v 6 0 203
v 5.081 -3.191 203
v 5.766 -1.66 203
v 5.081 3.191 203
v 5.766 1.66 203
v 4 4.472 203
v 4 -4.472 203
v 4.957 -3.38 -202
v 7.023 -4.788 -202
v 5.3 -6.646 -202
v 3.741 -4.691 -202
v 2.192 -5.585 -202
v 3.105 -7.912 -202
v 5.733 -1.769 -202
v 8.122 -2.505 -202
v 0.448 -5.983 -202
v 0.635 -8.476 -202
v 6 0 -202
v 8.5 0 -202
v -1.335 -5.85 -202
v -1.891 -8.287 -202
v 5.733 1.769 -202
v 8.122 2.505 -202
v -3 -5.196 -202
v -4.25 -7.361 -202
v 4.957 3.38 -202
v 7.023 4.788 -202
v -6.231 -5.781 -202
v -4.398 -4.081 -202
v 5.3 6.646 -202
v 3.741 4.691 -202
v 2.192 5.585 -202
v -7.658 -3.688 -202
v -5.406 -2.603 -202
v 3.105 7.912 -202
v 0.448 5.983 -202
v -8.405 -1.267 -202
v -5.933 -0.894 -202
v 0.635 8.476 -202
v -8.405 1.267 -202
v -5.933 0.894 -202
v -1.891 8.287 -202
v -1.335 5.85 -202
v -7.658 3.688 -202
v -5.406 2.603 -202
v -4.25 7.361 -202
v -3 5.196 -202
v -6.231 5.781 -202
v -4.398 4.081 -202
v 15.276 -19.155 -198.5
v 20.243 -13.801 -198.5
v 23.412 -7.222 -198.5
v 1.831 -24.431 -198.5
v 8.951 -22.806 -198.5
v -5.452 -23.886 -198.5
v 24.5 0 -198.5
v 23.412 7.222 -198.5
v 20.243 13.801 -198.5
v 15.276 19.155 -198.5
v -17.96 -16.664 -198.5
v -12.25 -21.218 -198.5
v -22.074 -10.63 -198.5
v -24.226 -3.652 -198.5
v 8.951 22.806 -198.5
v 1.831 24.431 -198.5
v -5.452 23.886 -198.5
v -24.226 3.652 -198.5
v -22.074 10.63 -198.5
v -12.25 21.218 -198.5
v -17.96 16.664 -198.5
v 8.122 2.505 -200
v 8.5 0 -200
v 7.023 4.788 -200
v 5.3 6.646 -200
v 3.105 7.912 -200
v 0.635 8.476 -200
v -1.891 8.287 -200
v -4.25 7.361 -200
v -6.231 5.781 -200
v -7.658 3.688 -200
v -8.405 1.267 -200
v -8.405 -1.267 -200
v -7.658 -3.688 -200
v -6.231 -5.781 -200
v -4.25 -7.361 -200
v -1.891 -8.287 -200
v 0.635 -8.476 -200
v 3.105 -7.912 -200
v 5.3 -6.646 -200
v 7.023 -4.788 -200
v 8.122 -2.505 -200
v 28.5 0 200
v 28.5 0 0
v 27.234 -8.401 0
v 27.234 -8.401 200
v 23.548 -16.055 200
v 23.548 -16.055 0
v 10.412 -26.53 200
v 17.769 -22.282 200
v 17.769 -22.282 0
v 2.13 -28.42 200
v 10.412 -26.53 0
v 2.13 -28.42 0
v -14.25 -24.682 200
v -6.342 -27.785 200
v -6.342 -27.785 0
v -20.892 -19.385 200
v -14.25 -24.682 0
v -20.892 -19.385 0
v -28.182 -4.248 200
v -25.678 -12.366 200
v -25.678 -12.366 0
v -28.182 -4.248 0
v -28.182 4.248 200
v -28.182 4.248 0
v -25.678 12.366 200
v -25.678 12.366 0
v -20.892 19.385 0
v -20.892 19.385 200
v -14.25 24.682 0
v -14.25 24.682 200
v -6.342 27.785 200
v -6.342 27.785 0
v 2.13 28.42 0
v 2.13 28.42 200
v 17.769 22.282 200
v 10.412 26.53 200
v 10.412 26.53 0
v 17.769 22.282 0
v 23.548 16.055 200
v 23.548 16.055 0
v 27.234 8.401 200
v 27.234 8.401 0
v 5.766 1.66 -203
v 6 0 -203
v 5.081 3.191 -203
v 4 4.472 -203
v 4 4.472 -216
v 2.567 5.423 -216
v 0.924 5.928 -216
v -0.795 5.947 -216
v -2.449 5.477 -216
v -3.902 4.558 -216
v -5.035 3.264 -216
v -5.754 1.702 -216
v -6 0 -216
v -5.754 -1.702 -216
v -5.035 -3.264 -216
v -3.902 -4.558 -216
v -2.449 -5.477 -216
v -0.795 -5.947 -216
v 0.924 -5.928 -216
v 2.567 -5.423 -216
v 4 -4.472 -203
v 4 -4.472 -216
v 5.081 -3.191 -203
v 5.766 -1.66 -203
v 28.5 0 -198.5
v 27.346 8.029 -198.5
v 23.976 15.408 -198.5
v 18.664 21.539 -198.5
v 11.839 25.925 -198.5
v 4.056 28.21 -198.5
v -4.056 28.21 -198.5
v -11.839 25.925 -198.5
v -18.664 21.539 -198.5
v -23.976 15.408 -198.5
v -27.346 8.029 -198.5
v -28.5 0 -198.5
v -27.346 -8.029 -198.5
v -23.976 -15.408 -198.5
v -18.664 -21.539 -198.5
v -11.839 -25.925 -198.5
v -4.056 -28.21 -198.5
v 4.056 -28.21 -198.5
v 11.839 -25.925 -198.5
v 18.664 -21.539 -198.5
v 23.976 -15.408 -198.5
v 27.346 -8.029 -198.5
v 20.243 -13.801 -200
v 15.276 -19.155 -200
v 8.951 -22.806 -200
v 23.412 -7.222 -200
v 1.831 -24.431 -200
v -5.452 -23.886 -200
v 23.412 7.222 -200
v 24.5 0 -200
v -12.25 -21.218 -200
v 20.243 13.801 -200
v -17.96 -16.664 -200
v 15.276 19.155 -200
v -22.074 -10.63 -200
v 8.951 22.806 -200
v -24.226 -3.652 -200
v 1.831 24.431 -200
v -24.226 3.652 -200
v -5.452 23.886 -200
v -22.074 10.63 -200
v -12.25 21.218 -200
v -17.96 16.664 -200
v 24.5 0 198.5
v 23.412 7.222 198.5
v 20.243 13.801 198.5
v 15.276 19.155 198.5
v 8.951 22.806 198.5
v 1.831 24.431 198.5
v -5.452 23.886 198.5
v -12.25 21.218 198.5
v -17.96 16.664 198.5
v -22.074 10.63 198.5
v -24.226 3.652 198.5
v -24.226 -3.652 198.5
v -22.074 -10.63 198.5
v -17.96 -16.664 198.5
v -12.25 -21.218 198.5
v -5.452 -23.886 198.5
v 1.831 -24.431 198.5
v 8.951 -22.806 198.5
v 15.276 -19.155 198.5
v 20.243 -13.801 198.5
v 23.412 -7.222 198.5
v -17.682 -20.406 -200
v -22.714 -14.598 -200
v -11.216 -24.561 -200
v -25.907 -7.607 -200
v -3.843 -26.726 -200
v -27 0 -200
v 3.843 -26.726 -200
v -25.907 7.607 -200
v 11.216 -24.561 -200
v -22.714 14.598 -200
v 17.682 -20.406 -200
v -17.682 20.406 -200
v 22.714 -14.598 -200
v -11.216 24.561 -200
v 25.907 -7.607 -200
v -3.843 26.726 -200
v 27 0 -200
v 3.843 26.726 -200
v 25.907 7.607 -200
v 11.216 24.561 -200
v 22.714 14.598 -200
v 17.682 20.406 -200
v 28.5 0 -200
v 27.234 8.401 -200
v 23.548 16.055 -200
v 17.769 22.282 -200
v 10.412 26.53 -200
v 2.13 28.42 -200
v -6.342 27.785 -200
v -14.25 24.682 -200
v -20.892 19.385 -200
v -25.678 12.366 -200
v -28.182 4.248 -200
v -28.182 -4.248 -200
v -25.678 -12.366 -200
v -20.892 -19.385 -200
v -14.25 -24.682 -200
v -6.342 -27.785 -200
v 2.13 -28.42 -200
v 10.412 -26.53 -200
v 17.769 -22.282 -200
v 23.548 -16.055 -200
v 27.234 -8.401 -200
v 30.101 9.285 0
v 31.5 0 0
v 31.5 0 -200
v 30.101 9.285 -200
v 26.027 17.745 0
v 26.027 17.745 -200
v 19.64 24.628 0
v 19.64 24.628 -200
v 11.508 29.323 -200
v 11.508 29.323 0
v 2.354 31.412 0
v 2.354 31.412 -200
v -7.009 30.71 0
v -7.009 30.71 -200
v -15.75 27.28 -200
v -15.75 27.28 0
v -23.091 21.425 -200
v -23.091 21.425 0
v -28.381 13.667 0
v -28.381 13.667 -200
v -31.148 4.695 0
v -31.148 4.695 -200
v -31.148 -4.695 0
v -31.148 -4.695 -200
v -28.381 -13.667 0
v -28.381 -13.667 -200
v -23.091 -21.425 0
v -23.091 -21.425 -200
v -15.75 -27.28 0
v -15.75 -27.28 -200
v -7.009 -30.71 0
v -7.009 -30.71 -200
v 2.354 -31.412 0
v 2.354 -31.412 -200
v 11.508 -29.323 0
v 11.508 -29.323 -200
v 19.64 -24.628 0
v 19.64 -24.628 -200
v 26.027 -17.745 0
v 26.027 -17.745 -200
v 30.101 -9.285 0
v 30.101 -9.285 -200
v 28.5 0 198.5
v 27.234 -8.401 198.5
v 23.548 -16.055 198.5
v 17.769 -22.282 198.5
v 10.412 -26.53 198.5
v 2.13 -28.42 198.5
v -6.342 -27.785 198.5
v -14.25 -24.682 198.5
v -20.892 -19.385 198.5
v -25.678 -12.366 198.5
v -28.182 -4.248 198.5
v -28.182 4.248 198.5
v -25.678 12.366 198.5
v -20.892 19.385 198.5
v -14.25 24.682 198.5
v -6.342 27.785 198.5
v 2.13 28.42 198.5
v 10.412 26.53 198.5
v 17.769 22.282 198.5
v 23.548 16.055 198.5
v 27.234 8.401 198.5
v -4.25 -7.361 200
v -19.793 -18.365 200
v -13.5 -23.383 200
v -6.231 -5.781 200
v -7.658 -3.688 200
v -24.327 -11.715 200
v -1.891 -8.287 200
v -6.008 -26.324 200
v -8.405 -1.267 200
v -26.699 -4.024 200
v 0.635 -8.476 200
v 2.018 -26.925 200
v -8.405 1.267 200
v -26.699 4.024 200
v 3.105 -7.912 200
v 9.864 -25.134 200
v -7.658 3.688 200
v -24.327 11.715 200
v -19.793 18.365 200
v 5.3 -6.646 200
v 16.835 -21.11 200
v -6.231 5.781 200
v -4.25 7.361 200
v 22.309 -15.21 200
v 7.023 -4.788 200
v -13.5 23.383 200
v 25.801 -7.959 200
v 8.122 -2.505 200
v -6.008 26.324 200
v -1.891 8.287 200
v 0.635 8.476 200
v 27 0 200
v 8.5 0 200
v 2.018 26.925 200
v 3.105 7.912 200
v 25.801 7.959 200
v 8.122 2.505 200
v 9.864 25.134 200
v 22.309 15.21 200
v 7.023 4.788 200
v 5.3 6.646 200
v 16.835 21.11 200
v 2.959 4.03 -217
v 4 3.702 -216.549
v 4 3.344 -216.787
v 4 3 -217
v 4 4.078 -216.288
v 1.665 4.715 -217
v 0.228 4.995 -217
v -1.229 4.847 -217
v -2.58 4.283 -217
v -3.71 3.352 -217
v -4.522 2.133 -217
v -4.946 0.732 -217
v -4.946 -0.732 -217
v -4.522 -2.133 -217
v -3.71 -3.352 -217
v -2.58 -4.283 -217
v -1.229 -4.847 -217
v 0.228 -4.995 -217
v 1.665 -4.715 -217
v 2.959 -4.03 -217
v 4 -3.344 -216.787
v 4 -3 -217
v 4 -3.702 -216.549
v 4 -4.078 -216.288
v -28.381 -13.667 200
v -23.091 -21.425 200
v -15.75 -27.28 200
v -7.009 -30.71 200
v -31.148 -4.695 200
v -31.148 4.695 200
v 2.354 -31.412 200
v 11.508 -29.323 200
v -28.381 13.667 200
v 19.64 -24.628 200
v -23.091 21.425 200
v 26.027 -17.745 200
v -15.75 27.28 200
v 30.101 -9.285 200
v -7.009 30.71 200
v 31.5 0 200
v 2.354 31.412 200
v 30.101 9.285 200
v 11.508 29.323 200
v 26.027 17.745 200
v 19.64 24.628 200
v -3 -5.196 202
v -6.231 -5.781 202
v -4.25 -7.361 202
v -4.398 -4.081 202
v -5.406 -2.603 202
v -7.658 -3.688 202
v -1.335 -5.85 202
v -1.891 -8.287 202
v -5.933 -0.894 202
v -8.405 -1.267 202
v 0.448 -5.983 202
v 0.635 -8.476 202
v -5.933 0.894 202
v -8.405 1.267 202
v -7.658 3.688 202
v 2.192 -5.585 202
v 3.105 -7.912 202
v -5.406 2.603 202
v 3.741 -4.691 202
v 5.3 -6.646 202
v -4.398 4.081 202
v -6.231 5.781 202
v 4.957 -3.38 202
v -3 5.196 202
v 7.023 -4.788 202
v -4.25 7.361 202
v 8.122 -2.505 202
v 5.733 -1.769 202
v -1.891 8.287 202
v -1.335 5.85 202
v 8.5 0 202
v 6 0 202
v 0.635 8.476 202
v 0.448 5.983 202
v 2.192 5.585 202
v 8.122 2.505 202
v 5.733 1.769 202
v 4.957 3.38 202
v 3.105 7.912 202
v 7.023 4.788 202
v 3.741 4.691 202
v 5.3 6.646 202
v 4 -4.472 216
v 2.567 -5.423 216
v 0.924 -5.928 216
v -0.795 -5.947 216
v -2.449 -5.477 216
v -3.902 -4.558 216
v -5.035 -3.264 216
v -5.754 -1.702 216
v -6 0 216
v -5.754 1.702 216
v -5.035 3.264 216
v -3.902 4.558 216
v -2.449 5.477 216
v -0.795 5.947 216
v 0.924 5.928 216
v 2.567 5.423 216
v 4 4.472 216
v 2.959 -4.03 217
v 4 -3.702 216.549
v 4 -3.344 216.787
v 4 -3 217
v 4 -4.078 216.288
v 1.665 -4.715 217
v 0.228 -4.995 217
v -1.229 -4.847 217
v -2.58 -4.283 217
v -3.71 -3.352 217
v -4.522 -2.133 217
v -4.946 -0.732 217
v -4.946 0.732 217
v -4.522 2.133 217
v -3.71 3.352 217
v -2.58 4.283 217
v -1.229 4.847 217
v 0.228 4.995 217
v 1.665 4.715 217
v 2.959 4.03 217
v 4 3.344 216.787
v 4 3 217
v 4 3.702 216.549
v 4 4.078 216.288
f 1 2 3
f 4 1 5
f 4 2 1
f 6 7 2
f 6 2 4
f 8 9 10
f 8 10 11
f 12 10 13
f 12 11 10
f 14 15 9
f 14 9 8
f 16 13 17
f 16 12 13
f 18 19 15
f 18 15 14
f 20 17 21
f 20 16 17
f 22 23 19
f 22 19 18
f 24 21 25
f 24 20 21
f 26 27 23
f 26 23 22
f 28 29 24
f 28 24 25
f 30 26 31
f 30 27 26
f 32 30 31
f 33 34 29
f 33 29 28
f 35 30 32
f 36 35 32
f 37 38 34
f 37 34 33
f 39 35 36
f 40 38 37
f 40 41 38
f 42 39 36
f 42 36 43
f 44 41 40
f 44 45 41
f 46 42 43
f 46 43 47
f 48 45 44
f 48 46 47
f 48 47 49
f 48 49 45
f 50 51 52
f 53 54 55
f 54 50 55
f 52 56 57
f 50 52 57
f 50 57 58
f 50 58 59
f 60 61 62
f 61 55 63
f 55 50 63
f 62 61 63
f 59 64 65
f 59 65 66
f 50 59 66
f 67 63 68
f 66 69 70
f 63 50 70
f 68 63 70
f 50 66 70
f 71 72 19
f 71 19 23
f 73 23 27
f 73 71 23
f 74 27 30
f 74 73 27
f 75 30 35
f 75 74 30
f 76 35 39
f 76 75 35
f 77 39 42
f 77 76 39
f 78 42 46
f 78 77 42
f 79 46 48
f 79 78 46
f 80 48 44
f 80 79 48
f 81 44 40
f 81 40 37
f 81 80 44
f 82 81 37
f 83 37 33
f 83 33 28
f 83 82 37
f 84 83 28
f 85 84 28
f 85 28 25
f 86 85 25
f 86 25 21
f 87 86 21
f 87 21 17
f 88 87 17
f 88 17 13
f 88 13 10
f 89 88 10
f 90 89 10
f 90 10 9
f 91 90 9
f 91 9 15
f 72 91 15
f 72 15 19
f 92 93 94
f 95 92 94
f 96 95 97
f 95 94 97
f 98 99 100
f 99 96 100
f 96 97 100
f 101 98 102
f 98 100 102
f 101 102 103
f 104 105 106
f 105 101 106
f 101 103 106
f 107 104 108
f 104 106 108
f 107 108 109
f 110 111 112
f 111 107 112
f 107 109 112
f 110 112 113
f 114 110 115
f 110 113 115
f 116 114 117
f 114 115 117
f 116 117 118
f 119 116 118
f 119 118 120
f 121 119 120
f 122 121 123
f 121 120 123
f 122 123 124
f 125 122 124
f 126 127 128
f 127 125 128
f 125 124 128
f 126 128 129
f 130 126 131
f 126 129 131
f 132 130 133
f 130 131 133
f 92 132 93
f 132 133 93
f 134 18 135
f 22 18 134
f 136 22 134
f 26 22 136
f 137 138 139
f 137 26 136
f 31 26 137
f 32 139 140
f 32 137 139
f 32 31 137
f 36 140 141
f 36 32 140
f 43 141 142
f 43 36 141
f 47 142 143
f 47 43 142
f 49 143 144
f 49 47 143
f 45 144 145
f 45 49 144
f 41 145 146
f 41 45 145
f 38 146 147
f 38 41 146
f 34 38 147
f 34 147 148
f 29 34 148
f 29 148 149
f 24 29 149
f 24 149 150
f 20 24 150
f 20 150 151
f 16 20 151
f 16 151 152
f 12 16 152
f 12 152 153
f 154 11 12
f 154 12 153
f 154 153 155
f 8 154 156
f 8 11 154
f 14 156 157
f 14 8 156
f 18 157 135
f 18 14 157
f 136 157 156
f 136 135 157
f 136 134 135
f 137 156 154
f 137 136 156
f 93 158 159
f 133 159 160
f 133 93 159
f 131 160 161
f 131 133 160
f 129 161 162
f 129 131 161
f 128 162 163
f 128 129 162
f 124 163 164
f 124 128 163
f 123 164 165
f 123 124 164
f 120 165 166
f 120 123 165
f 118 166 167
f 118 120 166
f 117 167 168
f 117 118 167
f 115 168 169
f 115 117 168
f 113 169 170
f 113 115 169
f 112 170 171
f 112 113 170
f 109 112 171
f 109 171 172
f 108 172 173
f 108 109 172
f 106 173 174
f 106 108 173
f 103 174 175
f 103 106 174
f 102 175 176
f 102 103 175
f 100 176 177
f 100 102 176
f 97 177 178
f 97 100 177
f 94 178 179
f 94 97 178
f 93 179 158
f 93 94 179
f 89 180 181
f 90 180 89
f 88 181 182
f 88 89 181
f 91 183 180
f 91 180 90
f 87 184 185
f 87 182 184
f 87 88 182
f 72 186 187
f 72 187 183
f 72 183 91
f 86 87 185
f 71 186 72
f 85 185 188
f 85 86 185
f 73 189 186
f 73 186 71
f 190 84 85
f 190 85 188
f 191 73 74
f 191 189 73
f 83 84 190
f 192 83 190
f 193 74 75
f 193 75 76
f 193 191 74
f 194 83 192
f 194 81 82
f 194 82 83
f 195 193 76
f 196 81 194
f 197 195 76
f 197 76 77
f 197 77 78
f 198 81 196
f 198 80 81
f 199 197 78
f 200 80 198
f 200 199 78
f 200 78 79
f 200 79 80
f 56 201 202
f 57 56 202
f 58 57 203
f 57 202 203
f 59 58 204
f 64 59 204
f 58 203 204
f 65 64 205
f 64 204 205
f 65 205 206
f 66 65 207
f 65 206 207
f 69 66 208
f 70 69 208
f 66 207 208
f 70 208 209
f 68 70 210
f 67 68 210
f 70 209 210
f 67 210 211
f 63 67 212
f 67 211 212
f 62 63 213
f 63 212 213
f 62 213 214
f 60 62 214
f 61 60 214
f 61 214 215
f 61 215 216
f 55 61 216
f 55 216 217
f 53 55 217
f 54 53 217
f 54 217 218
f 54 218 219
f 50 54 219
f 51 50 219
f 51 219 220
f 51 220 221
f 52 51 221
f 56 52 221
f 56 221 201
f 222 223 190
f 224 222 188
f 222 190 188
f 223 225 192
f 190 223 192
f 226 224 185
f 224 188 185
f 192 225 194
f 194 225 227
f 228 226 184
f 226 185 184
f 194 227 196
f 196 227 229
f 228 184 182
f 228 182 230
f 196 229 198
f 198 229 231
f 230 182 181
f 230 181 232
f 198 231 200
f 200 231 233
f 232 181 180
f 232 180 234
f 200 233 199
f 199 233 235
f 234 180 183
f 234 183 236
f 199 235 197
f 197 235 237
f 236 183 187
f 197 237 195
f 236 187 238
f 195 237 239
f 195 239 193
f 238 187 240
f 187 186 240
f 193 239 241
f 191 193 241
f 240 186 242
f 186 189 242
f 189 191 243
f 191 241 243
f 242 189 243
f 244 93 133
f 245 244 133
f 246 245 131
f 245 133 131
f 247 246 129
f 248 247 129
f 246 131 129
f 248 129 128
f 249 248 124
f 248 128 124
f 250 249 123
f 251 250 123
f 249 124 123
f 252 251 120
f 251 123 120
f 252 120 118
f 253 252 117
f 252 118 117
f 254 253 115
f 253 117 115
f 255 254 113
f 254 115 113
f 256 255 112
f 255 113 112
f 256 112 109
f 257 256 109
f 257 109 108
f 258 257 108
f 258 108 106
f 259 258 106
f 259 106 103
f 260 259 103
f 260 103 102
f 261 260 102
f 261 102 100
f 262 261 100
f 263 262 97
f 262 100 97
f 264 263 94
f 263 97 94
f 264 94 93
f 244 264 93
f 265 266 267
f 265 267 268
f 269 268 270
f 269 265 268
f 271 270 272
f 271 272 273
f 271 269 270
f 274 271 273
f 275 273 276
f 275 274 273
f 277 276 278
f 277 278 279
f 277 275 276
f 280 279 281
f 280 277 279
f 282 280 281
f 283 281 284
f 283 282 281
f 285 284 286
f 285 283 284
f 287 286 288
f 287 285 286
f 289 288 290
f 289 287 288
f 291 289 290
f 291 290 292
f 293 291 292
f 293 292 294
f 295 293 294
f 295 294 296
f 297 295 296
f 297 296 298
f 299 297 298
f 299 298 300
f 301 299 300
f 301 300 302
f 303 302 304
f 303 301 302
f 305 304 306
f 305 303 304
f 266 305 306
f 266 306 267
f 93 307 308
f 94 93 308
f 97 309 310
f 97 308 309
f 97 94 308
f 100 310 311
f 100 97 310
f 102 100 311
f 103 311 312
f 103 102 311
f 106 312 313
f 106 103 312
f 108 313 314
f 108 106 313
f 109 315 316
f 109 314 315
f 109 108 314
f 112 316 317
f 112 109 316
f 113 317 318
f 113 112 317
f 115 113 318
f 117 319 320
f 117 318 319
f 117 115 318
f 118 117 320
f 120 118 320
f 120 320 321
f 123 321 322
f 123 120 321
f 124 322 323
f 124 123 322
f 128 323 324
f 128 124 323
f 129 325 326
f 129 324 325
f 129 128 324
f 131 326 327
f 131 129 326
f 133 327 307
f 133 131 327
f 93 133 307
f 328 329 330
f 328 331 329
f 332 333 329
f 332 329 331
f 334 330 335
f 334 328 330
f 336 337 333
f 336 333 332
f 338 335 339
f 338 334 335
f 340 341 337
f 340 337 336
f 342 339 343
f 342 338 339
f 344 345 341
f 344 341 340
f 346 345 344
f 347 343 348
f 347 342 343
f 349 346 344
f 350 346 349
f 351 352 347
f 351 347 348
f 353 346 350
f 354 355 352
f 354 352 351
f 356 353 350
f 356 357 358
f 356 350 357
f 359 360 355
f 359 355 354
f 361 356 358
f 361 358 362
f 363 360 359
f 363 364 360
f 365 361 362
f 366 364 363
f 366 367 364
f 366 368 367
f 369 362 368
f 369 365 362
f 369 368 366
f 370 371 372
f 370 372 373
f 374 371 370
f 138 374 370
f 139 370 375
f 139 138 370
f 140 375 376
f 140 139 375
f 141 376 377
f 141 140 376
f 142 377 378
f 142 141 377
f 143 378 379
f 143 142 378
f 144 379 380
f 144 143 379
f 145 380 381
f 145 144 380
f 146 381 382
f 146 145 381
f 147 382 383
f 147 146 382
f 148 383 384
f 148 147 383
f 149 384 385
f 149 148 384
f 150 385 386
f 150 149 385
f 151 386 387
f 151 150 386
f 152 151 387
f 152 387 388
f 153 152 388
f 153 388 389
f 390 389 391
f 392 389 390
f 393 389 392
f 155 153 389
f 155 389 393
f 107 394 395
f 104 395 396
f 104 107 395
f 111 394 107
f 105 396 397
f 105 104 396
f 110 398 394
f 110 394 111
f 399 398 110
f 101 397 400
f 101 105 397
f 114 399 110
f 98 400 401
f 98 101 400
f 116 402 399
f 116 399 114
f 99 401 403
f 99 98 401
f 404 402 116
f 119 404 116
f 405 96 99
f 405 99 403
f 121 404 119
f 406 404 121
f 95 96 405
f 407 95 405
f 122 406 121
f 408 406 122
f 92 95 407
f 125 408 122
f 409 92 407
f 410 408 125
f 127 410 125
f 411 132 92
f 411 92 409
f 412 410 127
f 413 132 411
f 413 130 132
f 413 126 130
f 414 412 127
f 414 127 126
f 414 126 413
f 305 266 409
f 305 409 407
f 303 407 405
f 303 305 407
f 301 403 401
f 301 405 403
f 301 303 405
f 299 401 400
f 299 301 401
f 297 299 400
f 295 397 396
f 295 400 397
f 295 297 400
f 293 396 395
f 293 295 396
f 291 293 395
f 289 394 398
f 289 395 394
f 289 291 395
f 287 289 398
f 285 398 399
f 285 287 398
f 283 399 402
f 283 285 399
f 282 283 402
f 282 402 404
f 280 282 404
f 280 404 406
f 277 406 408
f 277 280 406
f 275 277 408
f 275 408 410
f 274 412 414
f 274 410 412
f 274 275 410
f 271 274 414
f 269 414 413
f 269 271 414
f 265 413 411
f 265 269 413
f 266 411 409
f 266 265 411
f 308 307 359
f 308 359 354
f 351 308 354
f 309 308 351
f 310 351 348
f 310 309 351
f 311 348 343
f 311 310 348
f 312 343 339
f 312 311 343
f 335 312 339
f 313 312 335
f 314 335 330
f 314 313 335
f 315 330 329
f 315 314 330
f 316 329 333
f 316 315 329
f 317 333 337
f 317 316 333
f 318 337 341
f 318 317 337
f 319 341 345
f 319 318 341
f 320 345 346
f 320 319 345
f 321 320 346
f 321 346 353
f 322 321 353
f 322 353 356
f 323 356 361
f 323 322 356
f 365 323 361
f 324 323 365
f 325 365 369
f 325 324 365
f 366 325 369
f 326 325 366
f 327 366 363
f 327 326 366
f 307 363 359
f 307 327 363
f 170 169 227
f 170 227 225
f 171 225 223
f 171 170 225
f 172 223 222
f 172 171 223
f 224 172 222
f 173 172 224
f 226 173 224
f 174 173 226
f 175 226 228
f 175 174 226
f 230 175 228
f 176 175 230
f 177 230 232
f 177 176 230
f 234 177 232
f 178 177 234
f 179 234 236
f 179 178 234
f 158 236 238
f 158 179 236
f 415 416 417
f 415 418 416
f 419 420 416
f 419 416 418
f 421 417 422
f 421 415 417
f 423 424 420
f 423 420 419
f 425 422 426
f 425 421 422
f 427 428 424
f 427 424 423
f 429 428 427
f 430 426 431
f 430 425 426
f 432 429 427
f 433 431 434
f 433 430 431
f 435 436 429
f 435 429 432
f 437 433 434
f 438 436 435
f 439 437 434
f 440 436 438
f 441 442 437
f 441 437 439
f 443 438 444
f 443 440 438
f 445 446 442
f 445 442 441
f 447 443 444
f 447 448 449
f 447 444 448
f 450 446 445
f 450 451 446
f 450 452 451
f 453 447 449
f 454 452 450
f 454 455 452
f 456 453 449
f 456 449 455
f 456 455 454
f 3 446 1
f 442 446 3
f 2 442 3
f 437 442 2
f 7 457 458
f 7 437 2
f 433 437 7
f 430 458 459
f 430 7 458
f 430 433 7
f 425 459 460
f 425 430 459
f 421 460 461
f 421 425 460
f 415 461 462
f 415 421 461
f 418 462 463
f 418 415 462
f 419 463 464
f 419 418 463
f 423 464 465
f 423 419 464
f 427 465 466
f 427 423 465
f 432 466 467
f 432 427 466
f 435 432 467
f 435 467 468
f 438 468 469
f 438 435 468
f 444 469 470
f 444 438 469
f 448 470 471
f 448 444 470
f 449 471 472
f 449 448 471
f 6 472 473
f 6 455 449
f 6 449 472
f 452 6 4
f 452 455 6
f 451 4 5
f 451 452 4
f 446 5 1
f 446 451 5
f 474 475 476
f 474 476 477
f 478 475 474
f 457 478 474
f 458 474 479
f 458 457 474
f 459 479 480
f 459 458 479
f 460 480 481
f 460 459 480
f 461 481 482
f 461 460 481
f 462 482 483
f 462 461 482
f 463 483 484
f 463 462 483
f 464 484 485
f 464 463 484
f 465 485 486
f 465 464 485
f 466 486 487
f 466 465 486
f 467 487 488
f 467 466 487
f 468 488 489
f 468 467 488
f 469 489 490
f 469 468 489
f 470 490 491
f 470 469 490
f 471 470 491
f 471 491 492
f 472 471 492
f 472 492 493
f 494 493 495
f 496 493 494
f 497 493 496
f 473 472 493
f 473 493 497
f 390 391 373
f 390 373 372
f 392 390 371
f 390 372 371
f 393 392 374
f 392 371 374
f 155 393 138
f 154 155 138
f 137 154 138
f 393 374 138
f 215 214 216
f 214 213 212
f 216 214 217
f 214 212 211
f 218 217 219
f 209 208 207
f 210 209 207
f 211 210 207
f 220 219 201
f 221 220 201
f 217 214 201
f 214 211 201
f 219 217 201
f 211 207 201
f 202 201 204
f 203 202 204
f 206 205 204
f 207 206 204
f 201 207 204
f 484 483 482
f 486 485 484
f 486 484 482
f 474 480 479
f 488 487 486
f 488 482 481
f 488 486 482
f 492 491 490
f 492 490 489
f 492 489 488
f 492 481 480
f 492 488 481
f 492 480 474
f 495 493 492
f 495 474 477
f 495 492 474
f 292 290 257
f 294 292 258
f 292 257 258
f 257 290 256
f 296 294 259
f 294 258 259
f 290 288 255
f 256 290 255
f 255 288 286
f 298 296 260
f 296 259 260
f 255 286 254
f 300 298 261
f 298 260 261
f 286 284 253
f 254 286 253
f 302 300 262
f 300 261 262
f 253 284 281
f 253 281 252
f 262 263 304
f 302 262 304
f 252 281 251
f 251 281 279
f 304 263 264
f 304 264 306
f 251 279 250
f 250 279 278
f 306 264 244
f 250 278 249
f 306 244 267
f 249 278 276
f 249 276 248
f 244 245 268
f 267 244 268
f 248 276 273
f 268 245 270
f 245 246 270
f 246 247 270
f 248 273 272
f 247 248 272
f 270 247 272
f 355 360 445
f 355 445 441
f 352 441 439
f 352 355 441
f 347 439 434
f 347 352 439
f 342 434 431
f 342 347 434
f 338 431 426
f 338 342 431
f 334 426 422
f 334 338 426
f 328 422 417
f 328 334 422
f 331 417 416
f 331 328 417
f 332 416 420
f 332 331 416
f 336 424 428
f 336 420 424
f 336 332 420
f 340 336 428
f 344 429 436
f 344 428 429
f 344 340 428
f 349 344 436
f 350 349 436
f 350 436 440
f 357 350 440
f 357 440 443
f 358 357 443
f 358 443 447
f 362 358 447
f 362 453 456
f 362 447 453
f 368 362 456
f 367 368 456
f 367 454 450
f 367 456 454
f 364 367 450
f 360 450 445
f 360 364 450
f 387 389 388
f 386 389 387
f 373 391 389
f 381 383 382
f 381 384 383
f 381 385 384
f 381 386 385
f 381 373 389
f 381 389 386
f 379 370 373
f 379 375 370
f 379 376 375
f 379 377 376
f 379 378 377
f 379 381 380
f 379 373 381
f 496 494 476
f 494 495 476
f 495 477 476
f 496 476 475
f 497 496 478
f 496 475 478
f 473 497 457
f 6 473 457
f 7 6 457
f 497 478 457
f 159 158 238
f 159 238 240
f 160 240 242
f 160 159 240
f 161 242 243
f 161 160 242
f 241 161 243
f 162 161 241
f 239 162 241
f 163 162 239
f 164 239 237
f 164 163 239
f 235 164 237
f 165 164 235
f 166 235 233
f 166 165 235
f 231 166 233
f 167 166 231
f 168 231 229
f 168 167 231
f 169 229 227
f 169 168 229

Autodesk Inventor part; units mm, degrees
ref_plane "YZ Plane" through (0, 0, 0) normal (1, 0, 0) x (0, 1, 0)
ref_plane "XZ Plane" through (0, 0, 0) normal (0, 1, 0) x (-1, 0, 0)
ref_plane "XY Plane" through (0, 0, 0) normal (0, 0, 1) x (1, 0, 0)
sketch "스케치9" plane through (0, 0, 0) normal (0, 0, 1) x (1, 0, 0)
  circle A0 centre (0, 0) radius 28.5
  dimension "d40" = 57
extrude "돌출4" add sketch "스케치9" along normal mid plane 400
sketch "스케치10" plane through (0, 0, 200) normal (0, 0, 1) x (1, 0, 0)
  circle A0 centre (0, 0) radius 28.5 construction
  circle A1 centre (0, 0) radius 24.5
  dimension "d43" = 4
extrude "돌출5" cut sketch "스케치10" against normal through all
sketch "스케치11" plane through (0, 0, 200) normal (0, 0, 1) x (1, 0, 0)
  circle A0 centre (0, 0) radius 28.5 construction
  circle A1 centre (0, 0) radius 28.5
extrude "돌출6" add sketch "스케치11" against normal blind 1.5
sketch "스케치12" plane through (0, 0, -200) normal (0, 0, -1) x (-1, 0, 0)
  circle A0 centre (0, 0) radius 28.5 construction
  circle A1 centre (0, 0) radius 28.5
extrude "돌출7" add sketch "스케치12" against normal blind 1.5
chamfer "모따기1" distance 1.5 angle 45 3 edges at (0, -28.5, -200) (0, 28.5, -200) (-28.5, 0, 200)
sketch "스케치13" plane through (0, 0, 200) normal (0, 0, 1) x (1, 0, 0)
  circle A0 centre (0, 0) radius 27 construction
  circle A1 centre (0, 0) radius 8.5
  dimension "d53" = 17
extrude "돌출8" add sketch "스케치13" along normal blind 2
sketch "스케치14" plane through (0, 0, 202) normal (0, 0, 1) x (1, 0, 0)
  circle A0 centre (0, 0) radius 8.5 construction
  circle A1 centre (0, 0) radius 6
  dimension "d56" = 12
extrude "돌출9" add sketch "스케치14" along normal blind 15
sketch "스케치15" plane through (0, 0, 217) normal (0, 0, 1) x (1, 0, 0)
  circle A0 centre (0, 0) radius 6 construction
  line L0 (39, 16) -> (4, 16)
  line L1 (4, 16) -> (4, -15)
  line L2 (4, -15) -> (39, -15)
  line L3 (39, -15) -> (39, 16)
  dimension "d59" = 4
extrude "돌출10" cut sketch "스케치15" against normal blind 14
chamfer "모따기2" distance 1 angle 45 1 edges at (-6, 0, 217)
mirror "미러1" about plane through (0, 0, 0) normal (0, 0, 1) of "돌출8", "돌출9", "돌출10", "모따기2"
sketch "스케치16" plane through (0, 0, 0) normal (0, 0, 1) x (1, 0, 0)
  circle A0 centre (0, 0) radius 6 construction
  circle A1 centre (0, 0) radius 31.5
  circle A2 centre (0, 0) radius 28.5 projected
  dimension "d65" = 63
extrude "돌출11" add sketch "스케치16" along normal mid plane 400 separate body
properties part number "FREE ROLLER" material "SS400"
